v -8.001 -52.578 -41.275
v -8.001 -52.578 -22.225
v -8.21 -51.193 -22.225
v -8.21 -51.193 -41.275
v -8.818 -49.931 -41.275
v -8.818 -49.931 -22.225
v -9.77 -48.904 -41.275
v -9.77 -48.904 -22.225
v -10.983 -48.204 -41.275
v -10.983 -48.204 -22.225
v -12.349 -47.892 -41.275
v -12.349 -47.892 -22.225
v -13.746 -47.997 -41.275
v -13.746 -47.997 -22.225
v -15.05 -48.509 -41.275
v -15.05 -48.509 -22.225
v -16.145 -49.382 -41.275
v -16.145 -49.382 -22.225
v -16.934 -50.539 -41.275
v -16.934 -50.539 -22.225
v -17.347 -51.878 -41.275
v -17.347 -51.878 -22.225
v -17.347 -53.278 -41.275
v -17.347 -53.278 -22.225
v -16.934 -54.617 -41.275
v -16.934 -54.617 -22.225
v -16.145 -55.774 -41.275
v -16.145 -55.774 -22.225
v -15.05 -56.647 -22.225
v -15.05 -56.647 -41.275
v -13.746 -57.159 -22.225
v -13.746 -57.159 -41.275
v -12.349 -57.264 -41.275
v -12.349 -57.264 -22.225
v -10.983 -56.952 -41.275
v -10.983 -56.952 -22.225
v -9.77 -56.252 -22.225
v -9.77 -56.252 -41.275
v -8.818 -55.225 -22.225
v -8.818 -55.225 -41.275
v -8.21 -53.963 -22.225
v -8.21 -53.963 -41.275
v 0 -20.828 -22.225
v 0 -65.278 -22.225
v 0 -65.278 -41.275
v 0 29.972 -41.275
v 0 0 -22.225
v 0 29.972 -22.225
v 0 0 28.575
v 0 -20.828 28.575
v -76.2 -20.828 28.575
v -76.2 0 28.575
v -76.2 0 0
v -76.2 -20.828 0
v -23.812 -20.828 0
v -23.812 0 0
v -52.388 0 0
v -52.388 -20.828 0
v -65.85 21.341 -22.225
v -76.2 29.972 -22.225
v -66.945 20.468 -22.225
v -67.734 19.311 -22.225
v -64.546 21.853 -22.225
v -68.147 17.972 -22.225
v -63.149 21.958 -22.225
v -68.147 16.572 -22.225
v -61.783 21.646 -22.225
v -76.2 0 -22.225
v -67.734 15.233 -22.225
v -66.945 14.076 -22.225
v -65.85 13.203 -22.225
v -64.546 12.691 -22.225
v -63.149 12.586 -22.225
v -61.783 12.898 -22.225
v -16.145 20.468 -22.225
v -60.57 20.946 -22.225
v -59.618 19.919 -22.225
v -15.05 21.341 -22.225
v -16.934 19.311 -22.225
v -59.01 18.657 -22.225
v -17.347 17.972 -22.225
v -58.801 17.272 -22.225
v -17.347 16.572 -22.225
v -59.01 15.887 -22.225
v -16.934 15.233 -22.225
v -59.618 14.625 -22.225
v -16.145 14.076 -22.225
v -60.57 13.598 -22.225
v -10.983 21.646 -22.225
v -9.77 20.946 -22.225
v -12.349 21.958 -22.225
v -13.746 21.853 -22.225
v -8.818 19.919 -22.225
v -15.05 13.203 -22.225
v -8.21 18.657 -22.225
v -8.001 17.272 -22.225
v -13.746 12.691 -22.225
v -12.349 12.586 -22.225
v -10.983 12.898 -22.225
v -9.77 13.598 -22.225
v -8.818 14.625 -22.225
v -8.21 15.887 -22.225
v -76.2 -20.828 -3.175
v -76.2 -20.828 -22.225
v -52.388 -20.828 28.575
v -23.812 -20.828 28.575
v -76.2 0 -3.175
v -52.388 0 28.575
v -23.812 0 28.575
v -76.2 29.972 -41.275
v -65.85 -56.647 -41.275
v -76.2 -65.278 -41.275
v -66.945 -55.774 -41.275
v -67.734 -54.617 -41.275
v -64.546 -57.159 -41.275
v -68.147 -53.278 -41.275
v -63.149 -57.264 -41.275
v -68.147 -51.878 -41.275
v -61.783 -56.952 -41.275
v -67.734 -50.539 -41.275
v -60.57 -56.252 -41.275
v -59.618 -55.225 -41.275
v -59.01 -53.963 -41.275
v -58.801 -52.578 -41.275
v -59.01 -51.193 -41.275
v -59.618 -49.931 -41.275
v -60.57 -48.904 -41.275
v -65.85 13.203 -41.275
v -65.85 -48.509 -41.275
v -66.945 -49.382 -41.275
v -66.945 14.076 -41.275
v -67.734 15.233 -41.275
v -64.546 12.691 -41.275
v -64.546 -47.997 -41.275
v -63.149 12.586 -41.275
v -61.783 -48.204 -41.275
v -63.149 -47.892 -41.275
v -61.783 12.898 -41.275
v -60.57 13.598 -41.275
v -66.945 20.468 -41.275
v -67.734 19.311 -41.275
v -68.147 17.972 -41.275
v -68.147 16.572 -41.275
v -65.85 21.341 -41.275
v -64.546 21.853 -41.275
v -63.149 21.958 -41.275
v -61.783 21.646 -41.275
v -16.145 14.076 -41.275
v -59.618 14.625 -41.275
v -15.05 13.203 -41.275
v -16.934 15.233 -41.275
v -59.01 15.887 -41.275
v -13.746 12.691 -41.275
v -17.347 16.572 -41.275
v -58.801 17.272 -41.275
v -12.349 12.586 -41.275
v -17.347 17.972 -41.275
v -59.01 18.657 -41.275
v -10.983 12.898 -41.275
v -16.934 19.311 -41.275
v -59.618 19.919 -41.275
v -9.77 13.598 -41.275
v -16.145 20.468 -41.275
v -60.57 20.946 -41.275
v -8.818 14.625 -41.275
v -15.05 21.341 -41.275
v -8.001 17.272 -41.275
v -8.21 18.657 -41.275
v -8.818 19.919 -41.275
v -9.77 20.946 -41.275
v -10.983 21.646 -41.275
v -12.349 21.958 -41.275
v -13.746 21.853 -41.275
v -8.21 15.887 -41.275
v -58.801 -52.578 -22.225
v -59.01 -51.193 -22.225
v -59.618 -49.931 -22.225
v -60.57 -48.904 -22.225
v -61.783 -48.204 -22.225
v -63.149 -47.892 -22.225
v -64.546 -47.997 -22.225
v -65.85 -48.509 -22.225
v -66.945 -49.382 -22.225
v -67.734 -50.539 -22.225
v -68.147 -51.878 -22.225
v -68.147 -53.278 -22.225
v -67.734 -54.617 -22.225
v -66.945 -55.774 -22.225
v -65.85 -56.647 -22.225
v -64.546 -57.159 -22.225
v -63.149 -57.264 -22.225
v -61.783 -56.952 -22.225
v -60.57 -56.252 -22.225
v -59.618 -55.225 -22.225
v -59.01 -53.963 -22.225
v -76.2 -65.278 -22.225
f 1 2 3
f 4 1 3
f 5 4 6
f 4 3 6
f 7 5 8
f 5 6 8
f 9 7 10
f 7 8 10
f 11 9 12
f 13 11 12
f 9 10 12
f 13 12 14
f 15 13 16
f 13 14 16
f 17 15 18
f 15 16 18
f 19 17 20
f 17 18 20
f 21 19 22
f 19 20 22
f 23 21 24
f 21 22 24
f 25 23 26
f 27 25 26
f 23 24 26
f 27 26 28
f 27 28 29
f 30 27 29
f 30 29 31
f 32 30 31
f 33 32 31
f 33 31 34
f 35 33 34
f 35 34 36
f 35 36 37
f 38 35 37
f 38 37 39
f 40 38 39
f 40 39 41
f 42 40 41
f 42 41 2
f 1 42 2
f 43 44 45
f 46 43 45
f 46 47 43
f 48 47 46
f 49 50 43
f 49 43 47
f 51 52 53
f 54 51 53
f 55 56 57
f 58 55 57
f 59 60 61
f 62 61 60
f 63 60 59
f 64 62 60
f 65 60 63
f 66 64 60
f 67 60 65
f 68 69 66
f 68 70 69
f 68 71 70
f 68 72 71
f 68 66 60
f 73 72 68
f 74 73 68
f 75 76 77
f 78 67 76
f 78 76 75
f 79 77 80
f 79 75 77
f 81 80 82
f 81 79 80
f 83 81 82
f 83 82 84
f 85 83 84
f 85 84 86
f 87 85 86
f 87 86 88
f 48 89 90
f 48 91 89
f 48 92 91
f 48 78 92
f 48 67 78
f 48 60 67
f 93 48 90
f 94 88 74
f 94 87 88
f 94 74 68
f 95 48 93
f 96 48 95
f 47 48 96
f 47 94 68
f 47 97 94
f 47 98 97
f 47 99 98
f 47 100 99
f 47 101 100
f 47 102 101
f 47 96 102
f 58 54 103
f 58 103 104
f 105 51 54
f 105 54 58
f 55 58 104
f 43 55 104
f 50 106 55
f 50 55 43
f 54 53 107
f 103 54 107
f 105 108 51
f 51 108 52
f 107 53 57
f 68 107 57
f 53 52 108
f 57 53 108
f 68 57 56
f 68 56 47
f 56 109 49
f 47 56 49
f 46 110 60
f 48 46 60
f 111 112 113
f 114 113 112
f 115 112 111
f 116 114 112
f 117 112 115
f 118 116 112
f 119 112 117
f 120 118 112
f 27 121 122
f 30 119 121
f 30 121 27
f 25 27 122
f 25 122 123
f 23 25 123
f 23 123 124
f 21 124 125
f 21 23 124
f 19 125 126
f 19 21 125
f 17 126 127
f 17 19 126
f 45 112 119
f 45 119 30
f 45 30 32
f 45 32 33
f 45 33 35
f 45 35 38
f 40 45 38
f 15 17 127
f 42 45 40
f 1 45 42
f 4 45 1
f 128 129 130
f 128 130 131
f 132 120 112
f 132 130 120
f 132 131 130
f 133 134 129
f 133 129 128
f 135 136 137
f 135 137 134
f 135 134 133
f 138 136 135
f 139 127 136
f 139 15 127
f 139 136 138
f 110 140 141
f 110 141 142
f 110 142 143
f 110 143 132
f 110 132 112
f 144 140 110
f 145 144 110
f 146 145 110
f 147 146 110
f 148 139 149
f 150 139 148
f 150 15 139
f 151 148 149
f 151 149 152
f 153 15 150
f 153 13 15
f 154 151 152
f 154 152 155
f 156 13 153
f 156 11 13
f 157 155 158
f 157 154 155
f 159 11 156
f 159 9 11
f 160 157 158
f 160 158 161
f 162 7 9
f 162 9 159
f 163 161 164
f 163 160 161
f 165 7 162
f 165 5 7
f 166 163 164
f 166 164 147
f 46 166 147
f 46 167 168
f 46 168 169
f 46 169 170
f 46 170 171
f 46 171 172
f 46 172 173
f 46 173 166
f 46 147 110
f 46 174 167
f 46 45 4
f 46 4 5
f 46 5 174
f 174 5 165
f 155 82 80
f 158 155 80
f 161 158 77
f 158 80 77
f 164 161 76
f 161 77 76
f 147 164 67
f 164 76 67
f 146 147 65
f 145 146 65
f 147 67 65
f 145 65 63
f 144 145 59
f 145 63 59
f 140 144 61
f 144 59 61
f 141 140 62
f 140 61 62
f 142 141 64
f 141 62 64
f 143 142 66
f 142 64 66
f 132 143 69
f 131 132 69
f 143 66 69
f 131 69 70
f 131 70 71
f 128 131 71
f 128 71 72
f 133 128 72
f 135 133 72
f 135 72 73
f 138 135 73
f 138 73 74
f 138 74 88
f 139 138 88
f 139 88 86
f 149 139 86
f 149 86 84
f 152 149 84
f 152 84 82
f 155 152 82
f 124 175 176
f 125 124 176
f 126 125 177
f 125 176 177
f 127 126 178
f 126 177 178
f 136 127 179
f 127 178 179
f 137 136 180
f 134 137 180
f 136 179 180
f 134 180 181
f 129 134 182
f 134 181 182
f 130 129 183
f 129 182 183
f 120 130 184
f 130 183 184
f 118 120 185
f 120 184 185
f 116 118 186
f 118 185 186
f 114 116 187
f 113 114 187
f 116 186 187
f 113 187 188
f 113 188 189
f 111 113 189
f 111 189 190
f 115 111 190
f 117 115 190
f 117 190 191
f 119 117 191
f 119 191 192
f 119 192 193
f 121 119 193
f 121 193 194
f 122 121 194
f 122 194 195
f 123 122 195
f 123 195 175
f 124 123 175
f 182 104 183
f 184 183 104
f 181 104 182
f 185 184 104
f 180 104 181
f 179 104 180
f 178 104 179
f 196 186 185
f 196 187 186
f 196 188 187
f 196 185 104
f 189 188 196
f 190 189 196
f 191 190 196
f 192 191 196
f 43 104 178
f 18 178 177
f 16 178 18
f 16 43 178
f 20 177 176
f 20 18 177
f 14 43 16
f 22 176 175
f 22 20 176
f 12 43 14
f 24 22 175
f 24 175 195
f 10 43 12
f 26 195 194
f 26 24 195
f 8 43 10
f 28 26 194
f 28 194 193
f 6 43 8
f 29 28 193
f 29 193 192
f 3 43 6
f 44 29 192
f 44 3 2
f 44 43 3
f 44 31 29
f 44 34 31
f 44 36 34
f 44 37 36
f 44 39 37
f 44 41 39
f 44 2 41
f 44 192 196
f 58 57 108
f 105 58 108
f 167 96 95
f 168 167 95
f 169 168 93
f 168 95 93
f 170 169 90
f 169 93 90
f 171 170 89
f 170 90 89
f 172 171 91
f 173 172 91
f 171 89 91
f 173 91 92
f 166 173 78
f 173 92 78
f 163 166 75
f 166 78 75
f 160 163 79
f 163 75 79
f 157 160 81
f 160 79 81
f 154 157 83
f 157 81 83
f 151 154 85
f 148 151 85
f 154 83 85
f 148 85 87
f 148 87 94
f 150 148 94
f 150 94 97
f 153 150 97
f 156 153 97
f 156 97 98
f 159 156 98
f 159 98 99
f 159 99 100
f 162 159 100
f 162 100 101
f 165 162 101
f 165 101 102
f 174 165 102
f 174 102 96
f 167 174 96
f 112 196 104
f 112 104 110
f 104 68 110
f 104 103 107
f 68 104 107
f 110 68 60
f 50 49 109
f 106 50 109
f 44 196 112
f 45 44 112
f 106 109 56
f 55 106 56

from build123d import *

# Parameters (mm, degrees)
F0_W     = 76.2
F0_H     = 19.05
F1_DEPTH = 20.828
F3_DEPTH = 76.2
F4_R     = 4.699
F5_DEPTH = 41.276


# Not quite as in the source:
# - ends of sketch curves that miss each other by under 0.0002 mm in the source are joined


with BuildPart() as f1:
    # F0 (on Front) → F1 (new body)
    with BuildSketch(Plane.XZ):
        Polygon((-23.8125, 0), (-52.3875009418, 0), (-52.3875009418, 28.575), (-76.2000009418, 28.575), (-76.2000009418, 0), (-76.2, -3.175), (0, -3.175), (0, 0), (0, 28.575), (-23.8125, 28.575), align=None)
        with Locations((-38.1, -12.7)):
            Rectangle(F0_W, F0_H)
    extrude(amount=F1_DEPTH)

    # F2 (on Right) → F3 (join)
    with BuildSketch(Plane.YZ):
        Polygon((0, -22.225), (-20.828, -22.225), (-65.278, -22.225), (-65.278, -41.275), (29.972, -41.275), (29.972, -22.225), align=None)
    extrude(amount=-F3_DEPTH)

    # F4 (on Top) → F5 (cut, through all)
    with BuildSketch(Plane.XY):
        with Locations((-12.7, 17.272)):
            Circle(F4_R)
        with Locations((-12.7, -52.578)):
            Circle(F4_R)
        with Locations((-63.5, -52.578)):
            Circle(F4_R)
        with Locations((-63.5, 17.272)):
            Circle(F4_R)
    extrude(amount=-F5_DEPTH, mode=Mode.SUBTRACT)


solid = f1.part
